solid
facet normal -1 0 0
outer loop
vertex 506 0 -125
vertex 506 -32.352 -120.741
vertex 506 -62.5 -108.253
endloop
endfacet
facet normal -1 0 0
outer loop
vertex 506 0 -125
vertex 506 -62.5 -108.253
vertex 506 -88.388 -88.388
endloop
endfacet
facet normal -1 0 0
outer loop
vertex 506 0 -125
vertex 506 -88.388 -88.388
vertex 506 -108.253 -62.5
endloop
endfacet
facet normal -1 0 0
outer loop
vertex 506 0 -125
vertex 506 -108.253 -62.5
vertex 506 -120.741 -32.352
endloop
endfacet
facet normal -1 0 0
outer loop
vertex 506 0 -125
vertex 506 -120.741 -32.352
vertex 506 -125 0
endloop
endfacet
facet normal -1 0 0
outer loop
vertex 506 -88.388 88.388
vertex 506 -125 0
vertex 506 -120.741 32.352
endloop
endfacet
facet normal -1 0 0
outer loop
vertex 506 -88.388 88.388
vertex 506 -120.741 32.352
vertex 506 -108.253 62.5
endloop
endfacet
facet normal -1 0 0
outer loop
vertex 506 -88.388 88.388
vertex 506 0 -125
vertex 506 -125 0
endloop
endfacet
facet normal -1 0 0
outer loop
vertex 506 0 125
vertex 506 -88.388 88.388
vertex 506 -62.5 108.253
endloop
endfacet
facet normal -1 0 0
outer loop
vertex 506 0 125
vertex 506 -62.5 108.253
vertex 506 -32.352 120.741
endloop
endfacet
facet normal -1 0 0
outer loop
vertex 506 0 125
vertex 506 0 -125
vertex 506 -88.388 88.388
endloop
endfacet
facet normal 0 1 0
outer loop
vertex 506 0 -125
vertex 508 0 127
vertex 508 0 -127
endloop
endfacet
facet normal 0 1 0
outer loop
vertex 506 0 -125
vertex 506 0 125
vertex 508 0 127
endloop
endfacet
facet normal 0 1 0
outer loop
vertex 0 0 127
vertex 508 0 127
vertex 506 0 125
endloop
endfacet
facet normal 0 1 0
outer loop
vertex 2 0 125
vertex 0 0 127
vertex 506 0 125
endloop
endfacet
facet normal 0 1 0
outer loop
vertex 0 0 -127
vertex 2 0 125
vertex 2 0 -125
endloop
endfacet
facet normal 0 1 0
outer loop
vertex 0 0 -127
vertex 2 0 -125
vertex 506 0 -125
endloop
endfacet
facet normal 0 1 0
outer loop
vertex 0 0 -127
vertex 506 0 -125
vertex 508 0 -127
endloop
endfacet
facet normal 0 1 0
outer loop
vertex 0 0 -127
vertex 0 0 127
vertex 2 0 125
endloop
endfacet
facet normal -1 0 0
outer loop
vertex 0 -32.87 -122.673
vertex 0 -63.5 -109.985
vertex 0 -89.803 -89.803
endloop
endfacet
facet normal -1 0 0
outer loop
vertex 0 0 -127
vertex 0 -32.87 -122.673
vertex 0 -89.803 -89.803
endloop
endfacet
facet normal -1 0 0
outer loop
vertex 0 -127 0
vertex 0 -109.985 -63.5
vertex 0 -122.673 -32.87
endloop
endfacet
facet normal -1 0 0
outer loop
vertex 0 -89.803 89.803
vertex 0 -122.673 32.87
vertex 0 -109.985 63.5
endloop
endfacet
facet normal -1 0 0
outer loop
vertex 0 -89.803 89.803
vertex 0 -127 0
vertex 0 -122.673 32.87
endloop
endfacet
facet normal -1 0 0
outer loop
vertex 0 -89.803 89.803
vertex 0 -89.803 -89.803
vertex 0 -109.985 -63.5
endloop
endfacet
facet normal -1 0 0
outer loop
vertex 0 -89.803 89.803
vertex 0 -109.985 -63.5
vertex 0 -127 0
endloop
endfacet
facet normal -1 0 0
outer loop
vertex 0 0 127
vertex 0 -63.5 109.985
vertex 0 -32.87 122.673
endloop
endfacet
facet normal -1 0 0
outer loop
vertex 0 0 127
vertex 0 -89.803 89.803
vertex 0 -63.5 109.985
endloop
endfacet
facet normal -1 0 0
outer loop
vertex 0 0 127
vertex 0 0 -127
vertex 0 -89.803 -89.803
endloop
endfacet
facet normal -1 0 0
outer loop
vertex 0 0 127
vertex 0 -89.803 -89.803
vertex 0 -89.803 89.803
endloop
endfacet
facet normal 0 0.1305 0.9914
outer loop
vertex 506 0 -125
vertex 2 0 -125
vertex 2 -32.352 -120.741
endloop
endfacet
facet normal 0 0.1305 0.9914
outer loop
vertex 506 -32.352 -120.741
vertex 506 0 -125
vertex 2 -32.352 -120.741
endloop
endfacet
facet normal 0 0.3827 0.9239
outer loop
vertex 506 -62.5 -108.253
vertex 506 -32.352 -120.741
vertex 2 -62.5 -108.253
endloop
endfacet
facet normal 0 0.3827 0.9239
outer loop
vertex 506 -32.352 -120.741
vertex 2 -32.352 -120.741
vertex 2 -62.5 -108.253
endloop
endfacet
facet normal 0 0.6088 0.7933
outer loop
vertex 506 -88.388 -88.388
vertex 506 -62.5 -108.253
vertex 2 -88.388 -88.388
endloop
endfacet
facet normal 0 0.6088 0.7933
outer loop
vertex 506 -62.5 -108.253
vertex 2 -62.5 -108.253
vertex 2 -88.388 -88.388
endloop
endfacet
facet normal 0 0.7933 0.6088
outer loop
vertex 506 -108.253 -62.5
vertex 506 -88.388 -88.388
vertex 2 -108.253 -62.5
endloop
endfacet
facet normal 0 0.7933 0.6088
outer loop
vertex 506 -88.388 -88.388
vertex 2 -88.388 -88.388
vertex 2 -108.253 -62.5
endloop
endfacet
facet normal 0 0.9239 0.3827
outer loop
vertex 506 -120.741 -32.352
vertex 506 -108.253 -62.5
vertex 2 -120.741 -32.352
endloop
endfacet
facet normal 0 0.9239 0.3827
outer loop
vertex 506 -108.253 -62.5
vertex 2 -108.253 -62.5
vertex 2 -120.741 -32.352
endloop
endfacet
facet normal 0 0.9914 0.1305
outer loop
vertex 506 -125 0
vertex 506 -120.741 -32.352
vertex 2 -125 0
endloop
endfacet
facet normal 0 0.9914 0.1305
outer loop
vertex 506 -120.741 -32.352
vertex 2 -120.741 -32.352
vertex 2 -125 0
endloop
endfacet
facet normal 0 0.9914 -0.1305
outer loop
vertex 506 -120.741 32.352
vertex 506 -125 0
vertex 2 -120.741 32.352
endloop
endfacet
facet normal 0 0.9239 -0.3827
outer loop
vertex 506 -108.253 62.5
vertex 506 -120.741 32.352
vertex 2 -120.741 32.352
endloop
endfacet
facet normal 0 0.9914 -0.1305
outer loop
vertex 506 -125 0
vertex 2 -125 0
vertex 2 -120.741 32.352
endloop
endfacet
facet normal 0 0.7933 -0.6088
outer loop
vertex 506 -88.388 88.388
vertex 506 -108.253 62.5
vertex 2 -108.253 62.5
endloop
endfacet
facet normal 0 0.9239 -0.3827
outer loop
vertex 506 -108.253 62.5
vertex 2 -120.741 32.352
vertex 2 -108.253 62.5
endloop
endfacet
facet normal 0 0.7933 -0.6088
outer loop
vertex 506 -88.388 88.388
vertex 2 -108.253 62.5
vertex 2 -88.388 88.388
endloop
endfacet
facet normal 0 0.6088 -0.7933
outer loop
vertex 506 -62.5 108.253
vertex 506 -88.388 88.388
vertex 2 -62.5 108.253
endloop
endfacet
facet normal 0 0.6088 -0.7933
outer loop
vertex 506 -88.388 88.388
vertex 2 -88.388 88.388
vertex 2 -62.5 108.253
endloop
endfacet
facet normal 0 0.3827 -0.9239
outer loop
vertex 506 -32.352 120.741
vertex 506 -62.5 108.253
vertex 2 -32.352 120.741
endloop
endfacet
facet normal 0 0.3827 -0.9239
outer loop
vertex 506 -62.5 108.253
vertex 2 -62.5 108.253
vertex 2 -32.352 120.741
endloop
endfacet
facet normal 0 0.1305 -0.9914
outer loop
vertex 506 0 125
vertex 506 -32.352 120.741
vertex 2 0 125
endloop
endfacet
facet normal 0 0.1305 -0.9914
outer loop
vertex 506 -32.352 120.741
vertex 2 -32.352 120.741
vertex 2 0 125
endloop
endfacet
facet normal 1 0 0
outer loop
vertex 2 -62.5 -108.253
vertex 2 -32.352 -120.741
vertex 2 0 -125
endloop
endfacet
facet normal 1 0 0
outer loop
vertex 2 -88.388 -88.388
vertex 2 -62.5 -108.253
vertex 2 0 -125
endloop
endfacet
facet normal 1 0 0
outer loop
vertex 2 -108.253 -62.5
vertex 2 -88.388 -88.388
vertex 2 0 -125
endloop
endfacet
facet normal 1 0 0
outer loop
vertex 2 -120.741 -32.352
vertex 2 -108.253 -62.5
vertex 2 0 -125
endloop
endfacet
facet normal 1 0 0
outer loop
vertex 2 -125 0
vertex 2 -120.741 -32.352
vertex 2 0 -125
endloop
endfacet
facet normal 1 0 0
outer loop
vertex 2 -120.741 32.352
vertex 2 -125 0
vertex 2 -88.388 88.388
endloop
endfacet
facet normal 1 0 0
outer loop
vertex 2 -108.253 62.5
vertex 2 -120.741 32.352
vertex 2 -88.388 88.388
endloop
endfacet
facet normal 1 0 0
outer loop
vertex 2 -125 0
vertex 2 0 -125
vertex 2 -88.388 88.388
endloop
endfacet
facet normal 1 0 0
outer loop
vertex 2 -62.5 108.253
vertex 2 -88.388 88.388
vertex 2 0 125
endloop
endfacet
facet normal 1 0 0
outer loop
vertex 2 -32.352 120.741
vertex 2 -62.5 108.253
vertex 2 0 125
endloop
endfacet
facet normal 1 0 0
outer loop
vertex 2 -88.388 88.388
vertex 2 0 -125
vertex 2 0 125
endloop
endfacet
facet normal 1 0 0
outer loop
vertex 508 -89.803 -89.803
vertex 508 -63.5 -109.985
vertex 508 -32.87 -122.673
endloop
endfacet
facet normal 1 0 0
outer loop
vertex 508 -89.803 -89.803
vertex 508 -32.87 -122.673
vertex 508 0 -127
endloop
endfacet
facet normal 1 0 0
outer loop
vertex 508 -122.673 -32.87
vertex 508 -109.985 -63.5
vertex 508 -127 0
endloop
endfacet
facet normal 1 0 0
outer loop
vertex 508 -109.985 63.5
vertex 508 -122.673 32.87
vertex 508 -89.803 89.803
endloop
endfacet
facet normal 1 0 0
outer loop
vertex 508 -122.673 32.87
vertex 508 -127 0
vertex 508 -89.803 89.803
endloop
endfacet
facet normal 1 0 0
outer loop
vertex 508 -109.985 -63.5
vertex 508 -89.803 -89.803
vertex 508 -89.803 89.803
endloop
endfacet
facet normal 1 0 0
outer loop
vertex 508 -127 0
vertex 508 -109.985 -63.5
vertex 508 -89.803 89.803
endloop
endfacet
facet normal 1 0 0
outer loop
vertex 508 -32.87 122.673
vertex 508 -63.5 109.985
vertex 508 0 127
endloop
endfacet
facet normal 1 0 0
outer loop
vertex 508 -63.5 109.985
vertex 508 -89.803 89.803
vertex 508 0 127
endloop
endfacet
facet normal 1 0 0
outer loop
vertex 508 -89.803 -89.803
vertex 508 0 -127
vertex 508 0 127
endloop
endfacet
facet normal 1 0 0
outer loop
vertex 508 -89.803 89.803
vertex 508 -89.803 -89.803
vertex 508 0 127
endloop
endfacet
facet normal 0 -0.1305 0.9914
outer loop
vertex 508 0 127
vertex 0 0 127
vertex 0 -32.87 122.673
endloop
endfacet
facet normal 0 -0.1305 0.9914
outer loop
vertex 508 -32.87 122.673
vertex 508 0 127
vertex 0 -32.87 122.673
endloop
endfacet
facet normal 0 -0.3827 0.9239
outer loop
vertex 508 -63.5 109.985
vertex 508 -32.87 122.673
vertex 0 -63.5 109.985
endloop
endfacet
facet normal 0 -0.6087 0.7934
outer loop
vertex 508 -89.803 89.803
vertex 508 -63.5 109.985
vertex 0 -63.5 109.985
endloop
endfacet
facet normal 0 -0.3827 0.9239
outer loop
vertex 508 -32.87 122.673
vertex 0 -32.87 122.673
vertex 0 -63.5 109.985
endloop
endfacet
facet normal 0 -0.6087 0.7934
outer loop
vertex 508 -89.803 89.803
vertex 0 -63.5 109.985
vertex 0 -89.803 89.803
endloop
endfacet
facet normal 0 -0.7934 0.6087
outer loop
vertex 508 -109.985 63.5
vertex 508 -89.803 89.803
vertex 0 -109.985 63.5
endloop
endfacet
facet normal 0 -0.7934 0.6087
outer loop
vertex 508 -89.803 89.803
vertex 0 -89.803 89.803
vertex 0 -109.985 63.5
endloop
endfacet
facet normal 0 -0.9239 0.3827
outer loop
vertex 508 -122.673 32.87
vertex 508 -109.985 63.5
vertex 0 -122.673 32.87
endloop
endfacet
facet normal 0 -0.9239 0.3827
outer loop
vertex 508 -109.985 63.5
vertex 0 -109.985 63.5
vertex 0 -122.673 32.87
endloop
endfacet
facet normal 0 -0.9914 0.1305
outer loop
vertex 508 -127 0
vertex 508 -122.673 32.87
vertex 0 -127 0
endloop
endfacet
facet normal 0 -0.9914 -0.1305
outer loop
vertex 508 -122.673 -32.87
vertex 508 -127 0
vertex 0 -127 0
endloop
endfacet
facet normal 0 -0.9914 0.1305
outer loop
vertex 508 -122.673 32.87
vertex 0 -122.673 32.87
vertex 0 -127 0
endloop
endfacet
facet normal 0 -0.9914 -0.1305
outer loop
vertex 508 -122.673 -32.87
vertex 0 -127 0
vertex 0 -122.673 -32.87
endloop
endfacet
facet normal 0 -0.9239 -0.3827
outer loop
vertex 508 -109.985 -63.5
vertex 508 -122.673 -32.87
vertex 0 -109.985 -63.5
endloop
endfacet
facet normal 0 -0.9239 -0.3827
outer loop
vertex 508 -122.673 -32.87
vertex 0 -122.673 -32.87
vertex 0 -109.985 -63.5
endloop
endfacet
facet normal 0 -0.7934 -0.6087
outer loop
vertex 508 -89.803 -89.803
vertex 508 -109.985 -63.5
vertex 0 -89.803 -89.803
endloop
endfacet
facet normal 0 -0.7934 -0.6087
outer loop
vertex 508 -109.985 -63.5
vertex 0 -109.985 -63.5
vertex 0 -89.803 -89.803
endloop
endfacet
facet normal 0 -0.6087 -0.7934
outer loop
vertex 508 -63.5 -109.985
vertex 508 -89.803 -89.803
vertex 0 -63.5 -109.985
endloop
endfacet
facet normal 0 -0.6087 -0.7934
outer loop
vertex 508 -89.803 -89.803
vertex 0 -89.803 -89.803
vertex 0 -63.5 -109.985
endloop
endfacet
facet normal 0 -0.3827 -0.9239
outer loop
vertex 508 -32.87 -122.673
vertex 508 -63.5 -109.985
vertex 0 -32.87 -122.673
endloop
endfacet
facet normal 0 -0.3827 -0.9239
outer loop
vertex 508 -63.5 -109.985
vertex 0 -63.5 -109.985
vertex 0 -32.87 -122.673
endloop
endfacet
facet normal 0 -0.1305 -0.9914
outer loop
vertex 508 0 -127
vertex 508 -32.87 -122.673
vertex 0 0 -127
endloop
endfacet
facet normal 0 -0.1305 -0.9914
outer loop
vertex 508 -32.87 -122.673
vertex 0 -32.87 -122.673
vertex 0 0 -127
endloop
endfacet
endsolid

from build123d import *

# Parameters (mm, degrees)
BOSS_EXTRUDE1_DEPTH = 508
BOSS_EXTRUDE2_START = -2
BOSS_EXTRUDE2_DEPTH = 2
LPATTERN1_COUNT     = 2
LPATTERN1_PITCH     = 506


with BuildPart() as part:
    # Sketch1 → Boss-Extrude1 (new body)
    with BuildSketch(Plane(origin=(0, 0, 0), x_dir=(0, 0, -1), z_dir=(1, 0, 0))):
        with BuildLine():
            Line((127, 0), (125, 0))
            ThreePointArc((125, 0), (0, -125), (-125, 0))
            Line((-125, 0), (-127, 0))
            ThreePointArc((-127, 0), (0, -127), (127, 0))
        make_face()
    extrude(amount=BOSS_EXTRUDE1_DEPTH)

    # Sketch2 → Boss-Extrude2 (add)
    with BuildSketch(Plane(origin=(508, 0, 0), x_dir=(0, 0, -1), z_dir=(1, 0, 0)).offset(BOSS_EXTRUDE2_START)):
        with BuildLine():
            Line((-125, 0), (125, 0))
            ThreePointArc((125, 0), (0, -125), (-125, 0))
        make_face()
    boss_extrude2 = extrude(amount=BOSS_EXTRUDE2_DEPTH)

    # LPattern1: Boss-Extrude2 ×2
    with Locations(*[(-i * LPATTERN1_PITCH, 0, 0) for i in range(1, LPATTERN1_COUNT)]):
        add(boss_extrude2)


solid = part.part
